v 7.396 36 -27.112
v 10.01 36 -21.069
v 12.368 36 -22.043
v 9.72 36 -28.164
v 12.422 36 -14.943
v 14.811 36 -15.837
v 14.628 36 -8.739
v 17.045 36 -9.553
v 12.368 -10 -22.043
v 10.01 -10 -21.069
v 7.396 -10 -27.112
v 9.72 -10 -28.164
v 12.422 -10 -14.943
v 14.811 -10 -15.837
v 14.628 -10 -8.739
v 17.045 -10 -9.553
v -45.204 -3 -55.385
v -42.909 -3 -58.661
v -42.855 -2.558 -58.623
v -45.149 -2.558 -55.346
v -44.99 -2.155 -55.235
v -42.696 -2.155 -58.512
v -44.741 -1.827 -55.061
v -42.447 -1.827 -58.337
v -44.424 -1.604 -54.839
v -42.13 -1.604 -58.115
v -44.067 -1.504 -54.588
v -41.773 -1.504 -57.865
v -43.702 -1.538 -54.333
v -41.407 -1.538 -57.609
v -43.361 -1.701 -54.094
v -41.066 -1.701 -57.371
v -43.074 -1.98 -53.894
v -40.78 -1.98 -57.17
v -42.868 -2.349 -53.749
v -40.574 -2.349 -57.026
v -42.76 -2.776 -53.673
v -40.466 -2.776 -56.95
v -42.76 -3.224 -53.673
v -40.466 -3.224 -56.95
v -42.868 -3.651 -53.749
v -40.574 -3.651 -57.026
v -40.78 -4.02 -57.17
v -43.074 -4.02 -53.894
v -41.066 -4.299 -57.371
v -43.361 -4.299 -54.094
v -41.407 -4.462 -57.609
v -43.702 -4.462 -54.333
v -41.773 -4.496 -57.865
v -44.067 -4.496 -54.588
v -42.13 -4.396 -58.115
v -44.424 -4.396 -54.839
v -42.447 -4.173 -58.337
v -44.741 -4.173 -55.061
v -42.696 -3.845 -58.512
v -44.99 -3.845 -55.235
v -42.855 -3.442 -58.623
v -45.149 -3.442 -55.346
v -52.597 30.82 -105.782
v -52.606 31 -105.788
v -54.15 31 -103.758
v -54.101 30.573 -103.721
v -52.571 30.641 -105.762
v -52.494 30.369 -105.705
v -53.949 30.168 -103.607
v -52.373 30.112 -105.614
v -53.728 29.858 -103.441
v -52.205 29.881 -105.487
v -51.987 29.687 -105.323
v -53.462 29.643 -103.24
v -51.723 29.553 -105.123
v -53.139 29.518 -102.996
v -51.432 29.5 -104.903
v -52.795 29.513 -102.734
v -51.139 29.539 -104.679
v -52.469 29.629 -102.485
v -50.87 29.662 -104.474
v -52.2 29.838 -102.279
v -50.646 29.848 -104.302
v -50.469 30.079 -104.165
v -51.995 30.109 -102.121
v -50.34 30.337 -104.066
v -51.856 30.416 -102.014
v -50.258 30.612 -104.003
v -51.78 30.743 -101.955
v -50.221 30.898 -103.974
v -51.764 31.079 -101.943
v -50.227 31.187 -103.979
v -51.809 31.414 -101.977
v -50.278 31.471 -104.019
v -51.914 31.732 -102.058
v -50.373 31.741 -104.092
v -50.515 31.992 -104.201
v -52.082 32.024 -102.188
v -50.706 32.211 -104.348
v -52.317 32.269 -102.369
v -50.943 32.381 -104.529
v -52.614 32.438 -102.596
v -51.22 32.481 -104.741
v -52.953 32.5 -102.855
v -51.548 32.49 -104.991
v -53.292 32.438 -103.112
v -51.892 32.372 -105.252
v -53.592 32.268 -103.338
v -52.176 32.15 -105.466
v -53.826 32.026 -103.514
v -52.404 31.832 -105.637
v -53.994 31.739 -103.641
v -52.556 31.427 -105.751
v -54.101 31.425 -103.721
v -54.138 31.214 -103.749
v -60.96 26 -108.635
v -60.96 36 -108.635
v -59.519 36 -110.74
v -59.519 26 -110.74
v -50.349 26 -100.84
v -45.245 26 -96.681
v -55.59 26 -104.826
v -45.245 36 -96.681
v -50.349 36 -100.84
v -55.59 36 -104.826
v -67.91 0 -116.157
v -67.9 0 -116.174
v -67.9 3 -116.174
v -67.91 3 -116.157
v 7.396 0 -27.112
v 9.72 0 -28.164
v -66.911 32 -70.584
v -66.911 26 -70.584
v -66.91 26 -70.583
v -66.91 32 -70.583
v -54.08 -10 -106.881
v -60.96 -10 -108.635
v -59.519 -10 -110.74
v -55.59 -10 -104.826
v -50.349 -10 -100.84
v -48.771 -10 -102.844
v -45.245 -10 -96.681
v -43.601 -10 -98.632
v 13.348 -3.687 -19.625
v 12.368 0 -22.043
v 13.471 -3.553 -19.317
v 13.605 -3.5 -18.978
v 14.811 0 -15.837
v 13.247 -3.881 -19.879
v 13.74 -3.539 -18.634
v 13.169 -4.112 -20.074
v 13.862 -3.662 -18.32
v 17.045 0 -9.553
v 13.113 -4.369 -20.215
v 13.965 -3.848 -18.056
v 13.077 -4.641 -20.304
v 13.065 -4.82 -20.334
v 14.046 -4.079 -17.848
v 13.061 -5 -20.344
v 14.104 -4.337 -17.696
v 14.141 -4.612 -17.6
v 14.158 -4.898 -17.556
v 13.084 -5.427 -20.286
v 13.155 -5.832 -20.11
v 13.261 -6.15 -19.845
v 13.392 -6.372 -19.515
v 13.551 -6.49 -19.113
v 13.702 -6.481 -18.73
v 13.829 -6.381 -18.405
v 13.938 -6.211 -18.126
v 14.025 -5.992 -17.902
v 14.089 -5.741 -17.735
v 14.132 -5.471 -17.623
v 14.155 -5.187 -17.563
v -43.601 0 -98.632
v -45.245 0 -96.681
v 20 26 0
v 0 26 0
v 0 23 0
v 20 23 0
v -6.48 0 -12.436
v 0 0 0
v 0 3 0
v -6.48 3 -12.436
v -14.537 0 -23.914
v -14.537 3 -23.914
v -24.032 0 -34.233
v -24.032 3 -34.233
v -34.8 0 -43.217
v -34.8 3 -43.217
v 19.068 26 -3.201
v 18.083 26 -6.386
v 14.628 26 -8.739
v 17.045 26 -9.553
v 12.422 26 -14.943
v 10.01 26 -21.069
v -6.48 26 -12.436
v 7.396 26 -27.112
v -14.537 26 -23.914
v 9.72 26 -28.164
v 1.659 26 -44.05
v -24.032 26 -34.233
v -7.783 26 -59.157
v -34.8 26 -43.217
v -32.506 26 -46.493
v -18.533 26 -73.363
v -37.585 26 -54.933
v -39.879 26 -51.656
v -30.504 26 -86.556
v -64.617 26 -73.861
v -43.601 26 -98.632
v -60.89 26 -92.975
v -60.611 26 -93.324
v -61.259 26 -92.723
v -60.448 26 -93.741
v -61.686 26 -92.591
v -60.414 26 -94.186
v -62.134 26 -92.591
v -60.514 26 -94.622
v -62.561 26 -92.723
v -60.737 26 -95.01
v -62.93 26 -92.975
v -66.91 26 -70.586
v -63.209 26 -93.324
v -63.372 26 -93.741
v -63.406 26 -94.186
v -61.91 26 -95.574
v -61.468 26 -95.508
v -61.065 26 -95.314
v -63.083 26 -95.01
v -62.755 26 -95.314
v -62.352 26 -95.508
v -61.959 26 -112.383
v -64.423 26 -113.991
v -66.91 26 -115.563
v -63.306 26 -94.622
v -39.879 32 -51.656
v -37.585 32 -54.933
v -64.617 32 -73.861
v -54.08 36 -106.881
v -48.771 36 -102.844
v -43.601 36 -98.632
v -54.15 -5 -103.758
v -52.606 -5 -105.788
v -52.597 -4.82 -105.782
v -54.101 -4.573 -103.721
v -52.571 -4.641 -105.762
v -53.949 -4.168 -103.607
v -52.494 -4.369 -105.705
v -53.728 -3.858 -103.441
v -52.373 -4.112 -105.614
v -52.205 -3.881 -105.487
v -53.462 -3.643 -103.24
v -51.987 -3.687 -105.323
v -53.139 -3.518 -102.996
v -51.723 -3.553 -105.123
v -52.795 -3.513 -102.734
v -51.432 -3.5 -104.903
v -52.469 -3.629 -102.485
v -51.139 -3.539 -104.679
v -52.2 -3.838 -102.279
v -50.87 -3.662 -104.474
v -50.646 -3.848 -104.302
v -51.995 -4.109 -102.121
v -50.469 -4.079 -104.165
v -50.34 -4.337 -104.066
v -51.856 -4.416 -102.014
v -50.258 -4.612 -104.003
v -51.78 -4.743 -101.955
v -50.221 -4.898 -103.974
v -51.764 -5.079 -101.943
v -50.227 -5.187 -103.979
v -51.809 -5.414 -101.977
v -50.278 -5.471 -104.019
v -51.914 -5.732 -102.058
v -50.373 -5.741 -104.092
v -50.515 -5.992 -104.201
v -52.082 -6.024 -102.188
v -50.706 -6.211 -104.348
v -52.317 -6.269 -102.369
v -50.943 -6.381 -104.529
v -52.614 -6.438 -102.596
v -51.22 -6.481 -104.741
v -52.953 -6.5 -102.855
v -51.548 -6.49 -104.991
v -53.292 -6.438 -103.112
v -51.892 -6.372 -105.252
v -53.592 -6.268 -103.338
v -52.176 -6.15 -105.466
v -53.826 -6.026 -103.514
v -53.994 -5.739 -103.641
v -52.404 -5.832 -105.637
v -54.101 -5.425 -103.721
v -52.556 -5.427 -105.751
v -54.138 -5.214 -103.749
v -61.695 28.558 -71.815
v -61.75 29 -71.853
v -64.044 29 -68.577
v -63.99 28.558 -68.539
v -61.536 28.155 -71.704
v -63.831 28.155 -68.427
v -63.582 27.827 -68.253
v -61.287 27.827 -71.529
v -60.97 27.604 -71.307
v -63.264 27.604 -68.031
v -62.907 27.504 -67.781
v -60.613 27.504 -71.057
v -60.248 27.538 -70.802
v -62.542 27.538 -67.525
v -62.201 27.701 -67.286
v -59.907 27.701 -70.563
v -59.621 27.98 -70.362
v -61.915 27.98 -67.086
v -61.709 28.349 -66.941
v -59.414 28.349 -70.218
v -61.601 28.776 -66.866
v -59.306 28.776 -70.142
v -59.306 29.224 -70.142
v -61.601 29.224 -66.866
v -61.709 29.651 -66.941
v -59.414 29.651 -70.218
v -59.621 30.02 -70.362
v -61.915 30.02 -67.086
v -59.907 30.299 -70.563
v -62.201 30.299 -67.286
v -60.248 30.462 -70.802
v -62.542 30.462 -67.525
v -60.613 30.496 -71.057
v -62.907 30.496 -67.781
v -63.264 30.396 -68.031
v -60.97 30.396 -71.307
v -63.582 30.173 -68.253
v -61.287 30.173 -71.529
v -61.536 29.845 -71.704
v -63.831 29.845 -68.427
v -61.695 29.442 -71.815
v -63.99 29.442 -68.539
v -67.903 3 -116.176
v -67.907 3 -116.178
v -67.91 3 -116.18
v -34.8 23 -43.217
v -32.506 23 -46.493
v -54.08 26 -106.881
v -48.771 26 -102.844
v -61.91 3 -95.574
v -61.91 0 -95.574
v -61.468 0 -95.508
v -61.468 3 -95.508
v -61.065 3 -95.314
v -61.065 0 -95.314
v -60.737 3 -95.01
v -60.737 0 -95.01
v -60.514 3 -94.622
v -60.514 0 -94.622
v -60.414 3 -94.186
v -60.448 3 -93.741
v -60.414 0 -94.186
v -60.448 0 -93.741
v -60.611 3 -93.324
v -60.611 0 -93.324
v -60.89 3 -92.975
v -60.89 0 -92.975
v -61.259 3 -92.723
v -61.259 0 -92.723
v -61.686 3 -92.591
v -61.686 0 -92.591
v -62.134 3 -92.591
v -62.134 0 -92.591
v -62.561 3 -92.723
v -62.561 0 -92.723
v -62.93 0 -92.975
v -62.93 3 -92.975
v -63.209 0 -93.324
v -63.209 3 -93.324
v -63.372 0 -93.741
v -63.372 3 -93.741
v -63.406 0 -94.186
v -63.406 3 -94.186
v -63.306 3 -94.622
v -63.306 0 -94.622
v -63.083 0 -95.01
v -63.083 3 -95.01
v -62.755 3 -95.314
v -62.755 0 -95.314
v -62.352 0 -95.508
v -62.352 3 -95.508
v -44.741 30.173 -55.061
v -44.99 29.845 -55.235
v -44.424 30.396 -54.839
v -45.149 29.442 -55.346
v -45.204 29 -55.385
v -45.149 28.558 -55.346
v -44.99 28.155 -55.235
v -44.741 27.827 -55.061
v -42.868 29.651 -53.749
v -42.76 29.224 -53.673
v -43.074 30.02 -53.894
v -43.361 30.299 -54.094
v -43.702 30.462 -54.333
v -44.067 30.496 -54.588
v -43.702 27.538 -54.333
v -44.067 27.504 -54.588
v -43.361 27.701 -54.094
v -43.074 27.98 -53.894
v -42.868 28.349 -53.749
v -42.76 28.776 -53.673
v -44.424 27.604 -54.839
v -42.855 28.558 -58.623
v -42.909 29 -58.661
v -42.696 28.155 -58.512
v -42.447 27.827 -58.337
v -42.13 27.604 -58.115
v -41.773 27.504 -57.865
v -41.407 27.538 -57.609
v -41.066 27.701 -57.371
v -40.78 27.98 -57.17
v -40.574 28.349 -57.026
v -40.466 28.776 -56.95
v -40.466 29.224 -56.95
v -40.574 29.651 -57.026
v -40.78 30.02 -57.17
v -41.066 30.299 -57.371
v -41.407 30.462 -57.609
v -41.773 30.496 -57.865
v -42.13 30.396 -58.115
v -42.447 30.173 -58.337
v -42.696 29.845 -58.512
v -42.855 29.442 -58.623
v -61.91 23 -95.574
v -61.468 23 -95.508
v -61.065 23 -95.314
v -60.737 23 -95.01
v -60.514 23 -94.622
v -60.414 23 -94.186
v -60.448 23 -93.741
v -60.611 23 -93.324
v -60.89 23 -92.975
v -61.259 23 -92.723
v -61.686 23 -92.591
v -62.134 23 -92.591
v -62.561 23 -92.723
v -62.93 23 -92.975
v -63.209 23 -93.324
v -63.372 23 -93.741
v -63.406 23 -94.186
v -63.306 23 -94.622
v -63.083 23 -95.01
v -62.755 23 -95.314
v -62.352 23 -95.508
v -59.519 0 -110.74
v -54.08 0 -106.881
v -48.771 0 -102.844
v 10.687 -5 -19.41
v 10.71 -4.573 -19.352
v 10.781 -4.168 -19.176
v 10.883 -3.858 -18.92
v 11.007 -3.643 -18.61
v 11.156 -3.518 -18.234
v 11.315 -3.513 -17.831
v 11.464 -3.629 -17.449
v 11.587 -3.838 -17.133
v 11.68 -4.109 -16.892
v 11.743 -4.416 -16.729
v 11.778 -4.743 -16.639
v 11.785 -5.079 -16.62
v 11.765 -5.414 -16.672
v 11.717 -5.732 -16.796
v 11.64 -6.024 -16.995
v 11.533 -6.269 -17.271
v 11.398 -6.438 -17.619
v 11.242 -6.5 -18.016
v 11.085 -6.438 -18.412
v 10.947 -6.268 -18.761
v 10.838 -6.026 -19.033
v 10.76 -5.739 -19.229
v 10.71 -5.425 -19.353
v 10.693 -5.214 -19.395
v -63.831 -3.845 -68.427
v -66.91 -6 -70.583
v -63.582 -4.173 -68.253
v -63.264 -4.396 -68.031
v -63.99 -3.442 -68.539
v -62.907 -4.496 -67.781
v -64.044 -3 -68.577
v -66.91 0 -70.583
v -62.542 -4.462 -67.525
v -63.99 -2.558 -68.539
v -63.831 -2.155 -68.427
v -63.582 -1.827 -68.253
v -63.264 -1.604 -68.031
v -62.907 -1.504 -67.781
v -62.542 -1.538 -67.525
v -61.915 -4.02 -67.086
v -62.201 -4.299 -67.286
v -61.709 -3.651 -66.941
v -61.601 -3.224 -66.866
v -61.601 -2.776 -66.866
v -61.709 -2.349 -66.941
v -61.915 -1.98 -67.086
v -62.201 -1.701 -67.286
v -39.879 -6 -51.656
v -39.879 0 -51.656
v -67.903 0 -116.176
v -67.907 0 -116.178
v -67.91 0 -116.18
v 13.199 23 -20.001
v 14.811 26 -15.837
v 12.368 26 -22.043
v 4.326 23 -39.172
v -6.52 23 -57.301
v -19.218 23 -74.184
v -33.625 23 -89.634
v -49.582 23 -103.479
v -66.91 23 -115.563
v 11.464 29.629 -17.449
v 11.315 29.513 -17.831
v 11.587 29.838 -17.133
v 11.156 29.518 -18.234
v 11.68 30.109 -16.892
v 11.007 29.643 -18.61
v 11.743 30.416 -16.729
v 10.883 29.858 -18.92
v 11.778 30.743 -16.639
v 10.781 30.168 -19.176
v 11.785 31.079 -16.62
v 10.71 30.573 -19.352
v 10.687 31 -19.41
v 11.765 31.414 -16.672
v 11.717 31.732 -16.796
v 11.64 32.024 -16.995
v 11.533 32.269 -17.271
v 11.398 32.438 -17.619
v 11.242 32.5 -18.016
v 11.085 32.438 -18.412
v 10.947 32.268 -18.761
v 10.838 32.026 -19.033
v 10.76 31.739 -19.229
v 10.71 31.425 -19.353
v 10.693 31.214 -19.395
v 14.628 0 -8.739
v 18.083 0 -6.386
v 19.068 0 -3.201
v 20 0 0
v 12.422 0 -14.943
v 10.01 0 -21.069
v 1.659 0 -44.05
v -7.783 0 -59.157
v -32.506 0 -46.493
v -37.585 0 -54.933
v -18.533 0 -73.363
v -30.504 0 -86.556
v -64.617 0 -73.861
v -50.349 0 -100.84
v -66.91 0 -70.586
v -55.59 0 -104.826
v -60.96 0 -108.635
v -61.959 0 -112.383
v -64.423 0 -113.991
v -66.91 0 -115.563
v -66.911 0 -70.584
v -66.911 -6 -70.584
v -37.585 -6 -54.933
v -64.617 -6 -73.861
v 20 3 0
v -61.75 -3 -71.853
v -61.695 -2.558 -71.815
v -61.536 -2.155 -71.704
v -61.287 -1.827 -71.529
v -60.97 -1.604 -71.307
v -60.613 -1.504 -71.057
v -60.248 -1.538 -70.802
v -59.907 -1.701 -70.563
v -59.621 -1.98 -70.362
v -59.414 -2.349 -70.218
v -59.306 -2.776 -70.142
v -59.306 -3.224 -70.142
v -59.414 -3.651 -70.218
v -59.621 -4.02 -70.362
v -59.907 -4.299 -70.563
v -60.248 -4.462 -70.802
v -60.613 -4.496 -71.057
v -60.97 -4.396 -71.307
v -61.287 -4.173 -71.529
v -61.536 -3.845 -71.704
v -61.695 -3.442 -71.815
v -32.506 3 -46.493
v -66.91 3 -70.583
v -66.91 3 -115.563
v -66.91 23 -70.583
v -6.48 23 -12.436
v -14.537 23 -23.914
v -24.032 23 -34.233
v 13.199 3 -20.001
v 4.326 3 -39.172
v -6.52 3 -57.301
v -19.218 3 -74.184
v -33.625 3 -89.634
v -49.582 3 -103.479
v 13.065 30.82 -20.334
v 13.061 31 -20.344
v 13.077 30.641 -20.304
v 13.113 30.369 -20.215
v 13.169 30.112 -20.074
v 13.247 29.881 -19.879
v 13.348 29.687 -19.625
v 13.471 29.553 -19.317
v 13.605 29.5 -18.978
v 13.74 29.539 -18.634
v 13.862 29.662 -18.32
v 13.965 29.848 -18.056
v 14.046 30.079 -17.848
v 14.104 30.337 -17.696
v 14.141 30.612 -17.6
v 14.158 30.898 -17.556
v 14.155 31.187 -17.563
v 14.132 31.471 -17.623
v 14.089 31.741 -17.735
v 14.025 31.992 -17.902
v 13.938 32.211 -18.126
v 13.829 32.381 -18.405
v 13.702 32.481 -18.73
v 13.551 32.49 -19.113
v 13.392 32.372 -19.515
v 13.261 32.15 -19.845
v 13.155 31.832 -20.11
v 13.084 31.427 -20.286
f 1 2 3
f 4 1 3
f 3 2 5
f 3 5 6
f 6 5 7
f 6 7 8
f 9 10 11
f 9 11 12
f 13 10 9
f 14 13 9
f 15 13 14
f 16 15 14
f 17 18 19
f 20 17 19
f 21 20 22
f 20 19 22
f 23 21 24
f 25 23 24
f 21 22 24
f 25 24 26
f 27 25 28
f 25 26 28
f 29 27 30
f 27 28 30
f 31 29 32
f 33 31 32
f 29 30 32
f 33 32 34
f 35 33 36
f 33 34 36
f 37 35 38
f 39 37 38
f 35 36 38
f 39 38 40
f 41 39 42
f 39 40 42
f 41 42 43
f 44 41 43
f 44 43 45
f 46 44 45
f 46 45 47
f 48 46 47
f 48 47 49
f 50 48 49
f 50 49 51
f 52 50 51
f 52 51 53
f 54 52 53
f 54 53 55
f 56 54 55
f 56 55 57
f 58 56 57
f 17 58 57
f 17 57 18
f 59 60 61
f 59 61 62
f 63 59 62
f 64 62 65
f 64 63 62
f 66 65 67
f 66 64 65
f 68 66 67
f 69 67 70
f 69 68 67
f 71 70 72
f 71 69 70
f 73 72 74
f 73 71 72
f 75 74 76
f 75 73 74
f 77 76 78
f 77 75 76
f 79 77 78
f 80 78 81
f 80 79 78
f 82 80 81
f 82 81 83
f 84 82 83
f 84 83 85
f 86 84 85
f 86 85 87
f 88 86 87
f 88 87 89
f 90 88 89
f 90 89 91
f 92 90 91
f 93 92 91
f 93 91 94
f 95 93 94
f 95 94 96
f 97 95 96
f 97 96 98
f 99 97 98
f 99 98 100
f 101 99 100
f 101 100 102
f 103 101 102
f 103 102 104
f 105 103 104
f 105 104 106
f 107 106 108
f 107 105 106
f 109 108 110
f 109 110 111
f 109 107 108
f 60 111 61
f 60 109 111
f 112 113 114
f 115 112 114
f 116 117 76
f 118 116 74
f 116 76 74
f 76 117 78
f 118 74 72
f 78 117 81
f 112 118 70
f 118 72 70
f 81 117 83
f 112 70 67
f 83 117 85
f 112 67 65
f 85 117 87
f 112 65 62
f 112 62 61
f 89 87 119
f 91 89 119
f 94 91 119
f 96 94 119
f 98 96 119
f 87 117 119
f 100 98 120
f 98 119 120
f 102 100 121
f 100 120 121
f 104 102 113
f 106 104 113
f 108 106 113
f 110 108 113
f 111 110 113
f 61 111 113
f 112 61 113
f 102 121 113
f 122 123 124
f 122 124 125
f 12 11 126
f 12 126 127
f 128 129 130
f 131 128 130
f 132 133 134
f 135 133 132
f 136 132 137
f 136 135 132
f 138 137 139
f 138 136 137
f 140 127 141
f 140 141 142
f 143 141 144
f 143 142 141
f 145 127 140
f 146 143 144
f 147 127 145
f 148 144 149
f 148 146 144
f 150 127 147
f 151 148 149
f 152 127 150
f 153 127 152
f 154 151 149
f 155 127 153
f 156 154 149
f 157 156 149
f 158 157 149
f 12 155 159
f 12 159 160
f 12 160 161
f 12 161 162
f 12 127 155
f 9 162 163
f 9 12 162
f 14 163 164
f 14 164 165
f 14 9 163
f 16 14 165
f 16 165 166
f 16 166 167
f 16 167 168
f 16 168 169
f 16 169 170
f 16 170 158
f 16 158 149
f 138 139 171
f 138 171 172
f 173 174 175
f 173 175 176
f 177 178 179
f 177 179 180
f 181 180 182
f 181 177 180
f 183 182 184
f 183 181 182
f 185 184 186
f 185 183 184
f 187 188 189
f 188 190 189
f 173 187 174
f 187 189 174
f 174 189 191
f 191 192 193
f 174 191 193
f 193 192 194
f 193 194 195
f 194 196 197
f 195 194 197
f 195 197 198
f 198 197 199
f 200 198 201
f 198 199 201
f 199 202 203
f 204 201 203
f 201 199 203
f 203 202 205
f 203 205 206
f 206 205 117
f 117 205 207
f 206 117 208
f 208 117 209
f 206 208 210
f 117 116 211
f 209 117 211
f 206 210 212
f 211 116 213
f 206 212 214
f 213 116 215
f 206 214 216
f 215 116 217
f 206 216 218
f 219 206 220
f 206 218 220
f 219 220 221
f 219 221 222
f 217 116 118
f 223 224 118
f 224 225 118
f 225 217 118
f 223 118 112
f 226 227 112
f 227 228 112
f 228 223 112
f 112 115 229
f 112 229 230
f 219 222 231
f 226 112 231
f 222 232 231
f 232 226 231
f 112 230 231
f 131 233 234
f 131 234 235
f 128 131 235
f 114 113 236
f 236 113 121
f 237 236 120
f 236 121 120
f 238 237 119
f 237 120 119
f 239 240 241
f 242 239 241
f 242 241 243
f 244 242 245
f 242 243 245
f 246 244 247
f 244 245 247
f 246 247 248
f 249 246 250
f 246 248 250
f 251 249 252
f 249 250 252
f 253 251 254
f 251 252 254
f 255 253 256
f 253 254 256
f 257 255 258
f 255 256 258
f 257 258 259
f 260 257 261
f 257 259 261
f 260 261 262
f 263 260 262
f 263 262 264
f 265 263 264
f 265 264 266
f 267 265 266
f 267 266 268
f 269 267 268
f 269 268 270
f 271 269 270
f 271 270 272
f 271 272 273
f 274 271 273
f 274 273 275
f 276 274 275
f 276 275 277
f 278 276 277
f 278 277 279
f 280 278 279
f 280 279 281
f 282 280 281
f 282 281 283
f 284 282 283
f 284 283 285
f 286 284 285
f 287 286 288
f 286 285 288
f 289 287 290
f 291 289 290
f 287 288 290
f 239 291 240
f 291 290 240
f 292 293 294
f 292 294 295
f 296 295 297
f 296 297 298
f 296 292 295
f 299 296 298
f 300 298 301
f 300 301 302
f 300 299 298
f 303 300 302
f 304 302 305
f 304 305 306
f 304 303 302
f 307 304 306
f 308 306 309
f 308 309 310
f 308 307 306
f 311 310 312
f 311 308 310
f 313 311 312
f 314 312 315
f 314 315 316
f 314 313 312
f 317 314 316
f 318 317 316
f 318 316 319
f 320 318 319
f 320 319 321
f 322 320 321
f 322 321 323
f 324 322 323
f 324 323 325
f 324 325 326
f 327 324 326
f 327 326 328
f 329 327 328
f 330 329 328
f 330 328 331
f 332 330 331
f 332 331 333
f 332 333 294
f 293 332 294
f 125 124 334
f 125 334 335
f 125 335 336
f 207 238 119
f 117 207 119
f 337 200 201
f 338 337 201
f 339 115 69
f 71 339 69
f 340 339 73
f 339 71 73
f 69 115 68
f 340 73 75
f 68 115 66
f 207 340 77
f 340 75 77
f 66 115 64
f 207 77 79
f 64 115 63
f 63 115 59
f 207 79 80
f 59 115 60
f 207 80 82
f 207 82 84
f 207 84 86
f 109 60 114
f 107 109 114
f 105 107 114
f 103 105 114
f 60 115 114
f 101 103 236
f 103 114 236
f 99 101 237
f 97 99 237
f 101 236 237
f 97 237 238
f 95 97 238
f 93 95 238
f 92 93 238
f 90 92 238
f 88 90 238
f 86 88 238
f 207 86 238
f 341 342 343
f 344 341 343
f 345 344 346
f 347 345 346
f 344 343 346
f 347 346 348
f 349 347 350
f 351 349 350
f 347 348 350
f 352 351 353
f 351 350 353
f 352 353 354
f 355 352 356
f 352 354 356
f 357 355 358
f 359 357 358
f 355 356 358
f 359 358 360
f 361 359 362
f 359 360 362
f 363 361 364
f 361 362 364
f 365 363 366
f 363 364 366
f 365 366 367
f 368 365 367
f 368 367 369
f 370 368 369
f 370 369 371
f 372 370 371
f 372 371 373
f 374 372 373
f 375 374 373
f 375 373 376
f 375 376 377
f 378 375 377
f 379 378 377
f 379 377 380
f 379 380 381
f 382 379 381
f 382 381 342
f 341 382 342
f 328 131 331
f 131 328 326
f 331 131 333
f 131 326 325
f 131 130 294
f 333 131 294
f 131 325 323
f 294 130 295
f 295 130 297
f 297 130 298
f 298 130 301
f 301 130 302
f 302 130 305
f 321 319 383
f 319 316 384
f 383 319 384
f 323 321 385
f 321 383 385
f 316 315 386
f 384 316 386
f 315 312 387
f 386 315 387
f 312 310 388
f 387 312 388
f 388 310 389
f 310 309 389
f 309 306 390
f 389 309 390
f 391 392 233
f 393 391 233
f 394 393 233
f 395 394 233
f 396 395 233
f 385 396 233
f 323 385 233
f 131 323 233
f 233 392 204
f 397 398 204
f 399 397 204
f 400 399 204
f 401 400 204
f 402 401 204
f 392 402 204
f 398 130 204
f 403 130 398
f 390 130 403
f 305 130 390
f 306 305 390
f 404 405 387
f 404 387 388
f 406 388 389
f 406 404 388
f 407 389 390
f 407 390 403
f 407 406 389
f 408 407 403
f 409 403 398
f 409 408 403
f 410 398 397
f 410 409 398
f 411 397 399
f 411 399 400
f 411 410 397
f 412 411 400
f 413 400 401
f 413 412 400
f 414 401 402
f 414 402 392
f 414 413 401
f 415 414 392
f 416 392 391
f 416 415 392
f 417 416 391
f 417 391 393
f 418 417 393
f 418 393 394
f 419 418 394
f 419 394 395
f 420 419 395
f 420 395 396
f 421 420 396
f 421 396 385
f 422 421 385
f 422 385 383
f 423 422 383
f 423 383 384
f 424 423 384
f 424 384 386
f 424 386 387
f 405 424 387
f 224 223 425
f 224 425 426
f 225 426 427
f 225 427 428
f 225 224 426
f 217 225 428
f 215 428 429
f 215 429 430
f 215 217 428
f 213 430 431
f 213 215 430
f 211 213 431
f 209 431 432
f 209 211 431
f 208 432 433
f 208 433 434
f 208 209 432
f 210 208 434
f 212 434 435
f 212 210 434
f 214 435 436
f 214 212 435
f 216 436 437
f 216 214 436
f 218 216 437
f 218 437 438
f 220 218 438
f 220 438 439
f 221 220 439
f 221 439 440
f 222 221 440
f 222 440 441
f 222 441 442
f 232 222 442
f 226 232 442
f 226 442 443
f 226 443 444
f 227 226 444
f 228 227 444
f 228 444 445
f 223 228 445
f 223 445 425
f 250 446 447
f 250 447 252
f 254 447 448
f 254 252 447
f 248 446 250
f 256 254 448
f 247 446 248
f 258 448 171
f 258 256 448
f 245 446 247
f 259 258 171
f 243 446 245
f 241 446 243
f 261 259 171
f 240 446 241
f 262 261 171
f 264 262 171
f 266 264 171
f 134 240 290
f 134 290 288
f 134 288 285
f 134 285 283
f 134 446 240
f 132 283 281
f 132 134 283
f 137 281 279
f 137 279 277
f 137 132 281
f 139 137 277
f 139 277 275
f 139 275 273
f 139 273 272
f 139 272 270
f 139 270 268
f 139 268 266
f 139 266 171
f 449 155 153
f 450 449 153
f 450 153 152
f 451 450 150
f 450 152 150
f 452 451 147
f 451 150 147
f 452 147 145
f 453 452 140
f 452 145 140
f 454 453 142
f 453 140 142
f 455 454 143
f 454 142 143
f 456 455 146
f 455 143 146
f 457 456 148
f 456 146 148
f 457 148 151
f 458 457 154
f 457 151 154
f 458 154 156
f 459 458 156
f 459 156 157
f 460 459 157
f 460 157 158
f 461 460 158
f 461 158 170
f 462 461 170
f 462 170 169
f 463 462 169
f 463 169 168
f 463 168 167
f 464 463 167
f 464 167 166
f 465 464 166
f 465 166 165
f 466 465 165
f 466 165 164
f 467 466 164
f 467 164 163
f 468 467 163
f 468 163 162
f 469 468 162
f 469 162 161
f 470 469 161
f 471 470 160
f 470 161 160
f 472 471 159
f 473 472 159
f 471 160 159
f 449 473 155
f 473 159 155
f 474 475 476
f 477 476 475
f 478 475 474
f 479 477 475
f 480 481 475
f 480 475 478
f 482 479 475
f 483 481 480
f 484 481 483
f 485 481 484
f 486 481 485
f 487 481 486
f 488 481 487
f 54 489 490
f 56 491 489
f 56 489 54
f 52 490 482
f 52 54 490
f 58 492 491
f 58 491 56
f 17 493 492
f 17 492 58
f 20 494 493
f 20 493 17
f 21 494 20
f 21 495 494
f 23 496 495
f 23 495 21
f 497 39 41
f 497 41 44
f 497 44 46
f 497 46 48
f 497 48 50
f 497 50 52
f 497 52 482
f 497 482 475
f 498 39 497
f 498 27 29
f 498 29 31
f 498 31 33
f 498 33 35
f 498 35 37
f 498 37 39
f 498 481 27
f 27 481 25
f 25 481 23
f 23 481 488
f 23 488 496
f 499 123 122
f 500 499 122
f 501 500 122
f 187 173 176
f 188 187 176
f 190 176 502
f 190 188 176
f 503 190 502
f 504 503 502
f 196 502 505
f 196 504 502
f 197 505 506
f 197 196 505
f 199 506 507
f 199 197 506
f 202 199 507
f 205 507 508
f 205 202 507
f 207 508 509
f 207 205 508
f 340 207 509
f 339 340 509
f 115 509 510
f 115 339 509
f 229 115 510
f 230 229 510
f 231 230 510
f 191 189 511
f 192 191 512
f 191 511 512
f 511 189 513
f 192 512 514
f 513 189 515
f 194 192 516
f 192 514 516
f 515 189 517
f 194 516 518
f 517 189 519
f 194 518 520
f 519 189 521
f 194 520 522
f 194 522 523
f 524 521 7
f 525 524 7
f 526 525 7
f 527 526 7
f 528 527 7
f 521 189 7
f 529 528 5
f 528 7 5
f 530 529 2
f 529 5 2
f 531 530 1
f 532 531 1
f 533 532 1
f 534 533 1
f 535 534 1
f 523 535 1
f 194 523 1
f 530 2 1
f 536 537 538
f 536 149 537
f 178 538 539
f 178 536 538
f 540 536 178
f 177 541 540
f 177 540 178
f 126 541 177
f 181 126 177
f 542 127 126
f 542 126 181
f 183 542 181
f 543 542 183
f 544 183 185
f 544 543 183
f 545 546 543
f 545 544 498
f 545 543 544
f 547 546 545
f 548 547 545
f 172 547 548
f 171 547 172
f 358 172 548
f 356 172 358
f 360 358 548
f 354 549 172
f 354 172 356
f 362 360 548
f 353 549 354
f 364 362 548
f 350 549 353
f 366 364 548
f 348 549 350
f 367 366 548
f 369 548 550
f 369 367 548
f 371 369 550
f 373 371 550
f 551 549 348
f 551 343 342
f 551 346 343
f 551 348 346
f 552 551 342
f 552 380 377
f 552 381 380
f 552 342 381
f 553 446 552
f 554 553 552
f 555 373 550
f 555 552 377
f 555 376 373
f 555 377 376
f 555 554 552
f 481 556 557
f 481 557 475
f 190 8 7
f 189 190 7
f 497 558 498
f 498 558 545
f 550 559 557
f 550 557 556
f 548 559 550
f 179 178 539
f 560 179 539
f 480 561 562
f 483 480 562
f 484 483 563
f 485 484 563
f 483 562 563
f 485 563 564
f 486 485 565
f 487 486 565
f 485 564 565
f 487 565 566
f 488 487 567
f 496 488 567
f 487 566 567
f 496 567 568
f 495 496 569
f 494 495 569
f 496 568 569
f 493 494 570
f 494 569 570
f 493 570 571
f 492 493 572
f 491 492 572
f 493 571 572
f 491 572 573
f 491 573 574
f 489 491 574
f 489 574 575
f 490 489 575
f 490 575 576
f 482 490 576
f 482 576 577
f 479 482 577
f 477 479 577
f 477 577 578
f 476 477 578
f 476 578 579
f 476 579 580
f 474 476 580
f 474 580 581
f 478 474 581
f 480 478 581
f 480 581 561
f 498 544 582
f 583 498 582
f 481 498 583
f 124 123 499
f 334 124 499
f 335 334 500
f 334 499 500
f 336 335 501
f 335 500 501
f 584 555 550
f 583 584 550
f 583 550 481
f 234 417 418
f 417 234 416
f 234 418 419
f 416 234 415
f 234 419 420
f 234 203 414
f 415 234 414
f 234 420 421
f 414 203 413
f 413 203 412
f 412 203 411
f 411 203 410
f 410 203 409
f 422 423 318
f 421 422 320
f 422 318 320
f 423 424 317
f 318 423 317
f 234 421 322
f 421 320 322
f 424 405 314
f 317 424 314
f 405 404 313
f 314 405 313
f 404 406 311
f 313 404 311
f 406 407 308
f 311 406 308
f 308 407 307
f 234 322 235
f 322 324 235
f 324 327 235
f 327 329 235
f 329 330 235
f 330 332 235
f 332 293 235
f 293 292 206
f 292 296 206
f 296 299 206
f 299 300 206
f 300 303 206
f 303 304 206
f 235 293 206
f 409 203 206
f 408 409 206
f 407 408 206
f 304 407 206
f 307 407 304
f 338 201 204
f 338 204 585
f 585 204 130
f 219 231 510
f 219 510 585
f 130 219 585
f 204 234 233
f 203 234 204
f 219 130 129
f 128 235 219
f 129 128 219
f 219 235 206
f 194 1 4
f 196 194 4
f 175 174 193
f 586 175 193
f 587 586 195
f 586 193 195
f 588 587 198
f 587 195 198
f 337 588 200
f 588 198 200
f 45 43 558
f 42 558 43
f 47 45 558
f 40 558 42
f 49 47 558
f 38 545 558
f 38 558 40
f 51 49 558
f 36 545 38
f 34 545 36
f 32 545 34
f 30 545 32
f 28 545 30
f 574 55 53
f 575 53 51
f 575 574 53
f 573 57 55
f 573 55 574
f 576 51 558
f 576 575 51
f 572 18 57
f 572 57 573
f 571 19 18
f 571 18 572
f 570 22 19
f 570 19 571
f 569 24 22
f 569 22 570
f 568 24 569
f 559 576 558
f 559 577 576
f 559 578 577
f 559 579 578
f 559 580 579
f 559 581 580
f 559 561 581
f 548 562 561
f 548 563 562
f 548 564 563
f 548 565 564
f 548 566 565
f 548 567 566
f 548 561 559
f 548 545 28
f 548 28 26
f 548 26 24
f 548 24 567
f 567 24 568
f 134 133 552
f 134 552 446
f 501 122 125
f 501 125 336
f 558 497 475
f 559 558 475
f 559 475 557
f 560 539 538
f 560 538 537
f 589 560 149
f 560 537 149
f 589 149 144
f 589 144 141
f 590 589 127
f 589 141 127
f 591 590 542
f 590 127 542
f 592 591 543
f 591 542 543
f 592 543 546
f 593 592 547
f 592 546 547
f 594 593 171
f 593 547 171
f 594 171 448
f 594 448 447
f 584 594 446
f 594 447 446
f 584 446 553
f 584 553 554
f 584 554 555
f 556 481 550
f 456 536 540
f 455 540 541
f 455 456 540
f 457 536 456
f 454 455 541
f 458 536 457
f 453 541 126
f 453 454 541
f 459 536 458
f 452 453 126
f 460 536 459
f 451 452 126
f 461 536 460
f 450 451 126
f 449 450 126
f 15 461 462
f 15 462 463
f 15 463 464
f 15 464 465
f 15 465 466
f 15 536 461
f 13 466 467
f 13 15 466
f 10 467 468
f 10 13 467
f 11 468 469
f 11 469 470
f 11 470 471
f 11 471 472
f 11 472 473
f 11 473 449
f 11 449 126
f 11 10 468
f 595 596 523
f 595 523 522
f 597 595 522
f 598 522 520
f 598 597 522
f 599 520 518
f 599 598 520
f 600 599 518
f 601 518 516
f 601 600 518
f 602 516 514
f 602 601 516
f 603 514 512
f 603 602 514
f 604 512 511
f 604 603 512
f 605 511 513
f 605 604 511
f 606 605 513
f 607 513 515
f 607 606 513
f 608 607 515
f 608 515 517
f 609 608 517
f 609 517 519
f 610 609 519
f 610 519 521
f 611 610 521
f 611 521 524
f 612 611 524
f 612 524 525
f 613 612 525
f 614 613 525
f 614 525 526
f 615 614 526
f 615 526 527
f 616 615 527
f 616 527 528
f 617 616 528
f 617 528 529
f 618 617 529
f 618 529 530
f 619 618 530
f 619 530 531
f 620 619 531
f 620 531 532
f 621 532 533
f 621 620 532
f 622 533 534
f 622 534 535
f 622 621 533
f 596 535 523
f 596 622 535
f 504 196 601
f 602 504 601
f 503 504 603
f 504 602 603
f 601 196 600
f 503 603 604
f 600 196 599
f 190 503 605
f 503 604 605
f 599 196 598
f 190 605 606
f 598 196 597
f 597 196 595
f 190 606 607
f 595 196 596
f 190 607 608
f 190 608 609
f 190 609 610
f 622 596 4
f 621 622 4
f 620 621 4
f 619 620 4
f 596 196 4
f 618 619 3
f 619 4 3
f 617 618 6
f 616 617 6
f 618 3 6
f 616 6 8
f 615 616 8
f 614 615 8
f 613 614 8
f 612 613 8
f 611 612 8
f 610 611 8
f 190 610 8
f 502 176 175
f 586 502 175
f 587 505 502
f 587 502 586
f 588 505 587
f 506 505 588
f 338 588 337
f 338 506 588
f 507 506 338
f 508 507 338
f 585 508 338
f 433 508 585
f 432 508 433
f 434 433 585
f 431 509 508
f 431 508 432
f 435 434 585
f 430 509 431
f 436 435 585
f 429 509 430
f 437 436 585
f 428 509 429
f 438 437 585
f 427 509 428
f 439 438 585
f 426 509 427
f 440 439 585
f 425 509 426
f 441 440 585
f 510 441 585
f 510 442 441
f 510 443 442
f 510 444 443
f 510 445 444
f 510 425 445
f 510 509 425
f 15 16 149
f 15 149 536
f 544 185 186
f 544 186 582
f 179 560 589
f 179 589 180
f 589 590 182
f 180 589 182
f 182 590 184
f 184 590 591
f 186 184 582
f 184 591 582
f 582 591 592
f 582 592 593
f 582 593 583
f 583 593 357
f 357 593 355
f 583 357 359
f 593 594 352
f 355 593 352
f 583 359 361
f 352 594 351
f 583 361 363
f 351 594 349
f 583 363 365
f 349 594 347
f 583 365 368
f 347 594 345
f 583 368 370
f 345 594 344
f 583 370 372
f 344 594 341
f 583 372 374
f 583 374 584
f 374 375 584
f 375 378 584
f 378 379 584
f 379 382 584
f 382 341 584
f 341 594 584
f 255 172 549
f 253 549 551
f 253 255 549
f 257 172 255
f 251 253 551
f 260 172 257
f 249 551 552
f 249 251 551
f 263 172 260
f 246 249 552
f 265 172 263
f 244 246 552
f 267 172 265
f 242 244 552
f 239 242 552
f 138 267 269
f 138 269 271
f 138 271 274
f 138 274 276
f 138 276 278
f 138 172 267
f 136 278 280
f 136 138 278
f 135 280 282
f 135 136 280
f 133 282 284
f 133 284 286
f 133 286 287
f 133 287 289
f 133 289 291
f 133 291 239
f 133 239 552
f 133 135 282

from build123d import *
from build123d.topology import SkipClean

# Parameters (mm, degrees)
BOSS_EXTRUDE1_DEPTH = 3
BOSS_EXTRUDE2_DEPTH = 6
SKETCH3_R           = 1.5
SKETCH3_W           = 9.001604742
SKETCH3_H           = 6
SKETCH3_W_2         = 4.02
CUT_EXTRUDE1_DEPTH  = 127.726009226
BOSS_EXTRUDE3_DEPTH = 3
BOSS_EXTRUDE4_START = 10
BOSS_EXTRUDE4_DEPTH = 10
SKETCH8_R           = 1.5
CUT_EXTRUDE2_DEPTH  = 128.550079345
SKETCH9_R           = 1.5
CUT_EXTRUDE3_DEPTH  = 140.296860914
CUT_EXTRUDE5_DEPTH  = 135.942804558
SKETCH10_R          = 1.5
CUT_EXTRUDE4_DEPTH  = 135.942804558


with BuildPart() as part:
    # Sketch1 → Boss-Extrude1 (new body)
    with BuildSketch(Plane(origin=(0, 0, 0), x_dir=(1, 0, 0), z_dir=(0, 1, 0))):
        with BuildLine():
            Line((0, 0), (20, 0))
            ThreePointArc((20, 0), (-12.999728612, 66.379532688), (-67.91, 116.18))
            Line((-67.91, 116.18), (-67.91, 72.58))
            ThreePointArc((-67.91, 72.58), (-27.76846685, 42.078474321), (0, 0))
        make_face()
    extrude(amount=BOSS_EXTRUDE1_DEPTH)

    # Sketch2 → Boss-Extrude2 (add)
    with BuildSketch(Plane.XZ):
        Polygon((-66.91, -70.583412503), (-32.50561414, -46.493202176), (-32.50561414, -51.376300531), (-67.91, -76.166718396), (-67.91, -71.283620041), align=None)
    extrude(amount=BOSS_EXTRUDE2_DEPTH)

    # Sketch3 → Cut-Extrude1 (cut, through all)
    with BuildSketch(Plane(origin=(13.44494558, 0, -19.201372231), x_dir=(-0.8191520442889929, 0, -0.5735764363510446), z_dir=(0.5735764363510446, 0, -0.819152044288993))):
        with Locations((90.296050234, -3)):
            Circle(SKETCH3_R)
        with Locations((67.296050234, -3)):
            Circle(SKETCH3_R)
        with Locations((57.795247863, -3)):
            Rectangle(SKETCH3_W, SKETCH3_H)
        with Locations((97.306050234, -3)):
            Rectangle(SKETCH3_W_2, SKETCH3_H)
    extrude(amount=-CUT_EXTRUDE1_DEPTH, mode=Mode.SUBTRACT)

    # Sketch5 → Boss-Extrude3 (add)
    with BuildSketch(Plane(origin=(0, 0, 0), x_dir=(1, 0, 0), z_dir=(0, 1, 0))):
        with BuildLine():
            Line((-66.911314527, 70.584332945), (-67.91, 70.584332945))
            Line((-67.91, 70.584332945), (-67.91, 72.58))
            ThreePointArc((-67.91, 72.58), (-27.76846685, 42.078474321), (0, 0))
            ThreePointArc((0, 0), (-14.53687211, 23.913782415), (-34.799919885, 43.216593999))
            Line((-34.799919885, 43.216593999), (-32.50561414, 46.493202176))
            Line((-32.50561414, 46.493202176), (-66.911314527, 70.584332945))
        make_face()
    extrude(amount=BOSS_EXTRUDE3_DEPTH)

    # Sketch6 → Boss-Extrude4 (add)
    with SkipClean():  # the faces are left unmerged after this step: merging them gives an invalid solid
        with BuildSketch(Plane.XZ.offset(BOSS_EXTRUDE4_START)):
            with BuildLine():
                Line((17.045225443, -9.553497125), (14.627759947, -8.739050999))
                ThreePointArc((14.627759947, -8.739050999), (11.241753199, -18.015971085), (7.396135604, -27.111987428))
                Line((7.396135604, -27.111987428), (9.72017103, -28.163805501))
                ThreePointArc((9.72017103, -28.163805501), (13.615472666, -18.950271792), (17.045225443, -9.553497125))
            make_face()
            with BuildLine():
                Line((-43.600864087, -98.631759771), (-45.244796978, -96.681132546))
                ThreePointArc((-45.244796978, -96.681132546), (-52.953020273, -102.854428394), (-60.960267052, -108.634591628))
                Line((-60.960267052, -108.634591628), (-59.519372567, -110.739653386))
                ThreePointArc((-59.519372567, -110.739653386), (-51.408674946, -104.884812453), (-43.600864087, -98.631759771))
            make_face()
        extrude(amount=-BOSS_EXTRUDE4_DEPTH)

    # Sketch8 → Cut-Extrude2 (cut, through all)
    with SkipClean():  # the faces are left unmerged after this step: merging them gives an invalid solid
        with BuildSketch(Plane(origin=(-51.408674946, -10, -104.884812453), x_dir=(-0.7959254239888501, 0, -0.6053946807233849), z_dir=(0.6053946807233849, 0, -0.7959254239888501))):
            with Locations((0, 5)):
                Circle(SKETCH8_R)
        extrude(amount=-CUT_EXTRUDE2_DEPTH, mode=Mode.SUBTRACT)

    # Sketch9 → Cut-Extrude3 (cut, through all)
    with SkipClean():  # the faces are left unmerged after this step: merging them gives an invalid solid
        with BuildSketch(Plane(origin=(18.247403502, 0, -7.182214333), x_dir=(-0.36625272068036263, 0, -0.9305154187837149), z_dir=(0.9305154187837149, 0, -0.36625272068036263))):
            with Locations((12.646816185, -5)):
                Circle(SKETCH9_R)
        extrude(amount=-CUT_EXTRUDE3_DEPTH, mode=Mode.SUBTRACT)

    # Sketch11 → Cut-Extrude5 (cut, through all)
    with SkipClean():  # the faces are left unmerged after this step: merging them gives an invalid solid
        with BuildSketch(Plane.XZ):
            with BuildLine():
                Line((-66.91, -70.583412503), (-66.91, -115.562519451))
                Line((-66.91, -115.562519451), (-66.91, -117.748905653))
                Line((-66.91, -117.748905653), (-78.626173162, -99.102139907))
                ThreePointArc((-78.626173162, -99.102139907), (-78.831832297, -91.769406487), (-72.513559714, -88.042382652))
                Line((-72.513559714, -88.042382652), (-69.539157742, -68.426897103))
                Line((-69.539157742, -68.426897103), (-66.91, -70.583412503))
            make_face()
        extrude(amount=-CUT_EXTRUDE5_DEPTH, mode=Mode.SUBTRACT)


with BuildPart() as cut_extrude5_piece_1:
    # of the separate pieces the step leaves, piece 1, a body of its own (cut_extrude5_pieces)
    add(part.part.solids().sort_by_distance((-64.617008782, 0, -73.860941122))[0])

    # Sketch10 → Cut-Extrude4 (cut, through all)
    with SkipClean():  # the faces are left unmerged after this step: merging them gives an invalid solid
        with BuildSketch(Plane.XZ):
            with Locations(Location((-61.91, -94.074364868, 0), (0, 0, 270))):
                Circle(SKETCH10_R)
        extrude(amount=-CUT_EXTRUDE4_DEPTH, mode=Mode.SUBTRACT)


with BuildPart() as cut_extrude5_piece_2:
    # of the separate pieces the step leaves, piece 2, a body of its own (cut_extrude5_pieces)
    add(part.part.solids().sort_by_distance((-67.91, 0, -116.18))[0])


with BuildPart() as body_3:
    # Mirror2: mirrored copy
    add(cut_extrude5_piece_1.part.mirror(Plane.ZX.offset(13)))


solid = Compound([cut_extrude5_piece_1.part, cut_extrude5_piece_2.part, body_3.part])
